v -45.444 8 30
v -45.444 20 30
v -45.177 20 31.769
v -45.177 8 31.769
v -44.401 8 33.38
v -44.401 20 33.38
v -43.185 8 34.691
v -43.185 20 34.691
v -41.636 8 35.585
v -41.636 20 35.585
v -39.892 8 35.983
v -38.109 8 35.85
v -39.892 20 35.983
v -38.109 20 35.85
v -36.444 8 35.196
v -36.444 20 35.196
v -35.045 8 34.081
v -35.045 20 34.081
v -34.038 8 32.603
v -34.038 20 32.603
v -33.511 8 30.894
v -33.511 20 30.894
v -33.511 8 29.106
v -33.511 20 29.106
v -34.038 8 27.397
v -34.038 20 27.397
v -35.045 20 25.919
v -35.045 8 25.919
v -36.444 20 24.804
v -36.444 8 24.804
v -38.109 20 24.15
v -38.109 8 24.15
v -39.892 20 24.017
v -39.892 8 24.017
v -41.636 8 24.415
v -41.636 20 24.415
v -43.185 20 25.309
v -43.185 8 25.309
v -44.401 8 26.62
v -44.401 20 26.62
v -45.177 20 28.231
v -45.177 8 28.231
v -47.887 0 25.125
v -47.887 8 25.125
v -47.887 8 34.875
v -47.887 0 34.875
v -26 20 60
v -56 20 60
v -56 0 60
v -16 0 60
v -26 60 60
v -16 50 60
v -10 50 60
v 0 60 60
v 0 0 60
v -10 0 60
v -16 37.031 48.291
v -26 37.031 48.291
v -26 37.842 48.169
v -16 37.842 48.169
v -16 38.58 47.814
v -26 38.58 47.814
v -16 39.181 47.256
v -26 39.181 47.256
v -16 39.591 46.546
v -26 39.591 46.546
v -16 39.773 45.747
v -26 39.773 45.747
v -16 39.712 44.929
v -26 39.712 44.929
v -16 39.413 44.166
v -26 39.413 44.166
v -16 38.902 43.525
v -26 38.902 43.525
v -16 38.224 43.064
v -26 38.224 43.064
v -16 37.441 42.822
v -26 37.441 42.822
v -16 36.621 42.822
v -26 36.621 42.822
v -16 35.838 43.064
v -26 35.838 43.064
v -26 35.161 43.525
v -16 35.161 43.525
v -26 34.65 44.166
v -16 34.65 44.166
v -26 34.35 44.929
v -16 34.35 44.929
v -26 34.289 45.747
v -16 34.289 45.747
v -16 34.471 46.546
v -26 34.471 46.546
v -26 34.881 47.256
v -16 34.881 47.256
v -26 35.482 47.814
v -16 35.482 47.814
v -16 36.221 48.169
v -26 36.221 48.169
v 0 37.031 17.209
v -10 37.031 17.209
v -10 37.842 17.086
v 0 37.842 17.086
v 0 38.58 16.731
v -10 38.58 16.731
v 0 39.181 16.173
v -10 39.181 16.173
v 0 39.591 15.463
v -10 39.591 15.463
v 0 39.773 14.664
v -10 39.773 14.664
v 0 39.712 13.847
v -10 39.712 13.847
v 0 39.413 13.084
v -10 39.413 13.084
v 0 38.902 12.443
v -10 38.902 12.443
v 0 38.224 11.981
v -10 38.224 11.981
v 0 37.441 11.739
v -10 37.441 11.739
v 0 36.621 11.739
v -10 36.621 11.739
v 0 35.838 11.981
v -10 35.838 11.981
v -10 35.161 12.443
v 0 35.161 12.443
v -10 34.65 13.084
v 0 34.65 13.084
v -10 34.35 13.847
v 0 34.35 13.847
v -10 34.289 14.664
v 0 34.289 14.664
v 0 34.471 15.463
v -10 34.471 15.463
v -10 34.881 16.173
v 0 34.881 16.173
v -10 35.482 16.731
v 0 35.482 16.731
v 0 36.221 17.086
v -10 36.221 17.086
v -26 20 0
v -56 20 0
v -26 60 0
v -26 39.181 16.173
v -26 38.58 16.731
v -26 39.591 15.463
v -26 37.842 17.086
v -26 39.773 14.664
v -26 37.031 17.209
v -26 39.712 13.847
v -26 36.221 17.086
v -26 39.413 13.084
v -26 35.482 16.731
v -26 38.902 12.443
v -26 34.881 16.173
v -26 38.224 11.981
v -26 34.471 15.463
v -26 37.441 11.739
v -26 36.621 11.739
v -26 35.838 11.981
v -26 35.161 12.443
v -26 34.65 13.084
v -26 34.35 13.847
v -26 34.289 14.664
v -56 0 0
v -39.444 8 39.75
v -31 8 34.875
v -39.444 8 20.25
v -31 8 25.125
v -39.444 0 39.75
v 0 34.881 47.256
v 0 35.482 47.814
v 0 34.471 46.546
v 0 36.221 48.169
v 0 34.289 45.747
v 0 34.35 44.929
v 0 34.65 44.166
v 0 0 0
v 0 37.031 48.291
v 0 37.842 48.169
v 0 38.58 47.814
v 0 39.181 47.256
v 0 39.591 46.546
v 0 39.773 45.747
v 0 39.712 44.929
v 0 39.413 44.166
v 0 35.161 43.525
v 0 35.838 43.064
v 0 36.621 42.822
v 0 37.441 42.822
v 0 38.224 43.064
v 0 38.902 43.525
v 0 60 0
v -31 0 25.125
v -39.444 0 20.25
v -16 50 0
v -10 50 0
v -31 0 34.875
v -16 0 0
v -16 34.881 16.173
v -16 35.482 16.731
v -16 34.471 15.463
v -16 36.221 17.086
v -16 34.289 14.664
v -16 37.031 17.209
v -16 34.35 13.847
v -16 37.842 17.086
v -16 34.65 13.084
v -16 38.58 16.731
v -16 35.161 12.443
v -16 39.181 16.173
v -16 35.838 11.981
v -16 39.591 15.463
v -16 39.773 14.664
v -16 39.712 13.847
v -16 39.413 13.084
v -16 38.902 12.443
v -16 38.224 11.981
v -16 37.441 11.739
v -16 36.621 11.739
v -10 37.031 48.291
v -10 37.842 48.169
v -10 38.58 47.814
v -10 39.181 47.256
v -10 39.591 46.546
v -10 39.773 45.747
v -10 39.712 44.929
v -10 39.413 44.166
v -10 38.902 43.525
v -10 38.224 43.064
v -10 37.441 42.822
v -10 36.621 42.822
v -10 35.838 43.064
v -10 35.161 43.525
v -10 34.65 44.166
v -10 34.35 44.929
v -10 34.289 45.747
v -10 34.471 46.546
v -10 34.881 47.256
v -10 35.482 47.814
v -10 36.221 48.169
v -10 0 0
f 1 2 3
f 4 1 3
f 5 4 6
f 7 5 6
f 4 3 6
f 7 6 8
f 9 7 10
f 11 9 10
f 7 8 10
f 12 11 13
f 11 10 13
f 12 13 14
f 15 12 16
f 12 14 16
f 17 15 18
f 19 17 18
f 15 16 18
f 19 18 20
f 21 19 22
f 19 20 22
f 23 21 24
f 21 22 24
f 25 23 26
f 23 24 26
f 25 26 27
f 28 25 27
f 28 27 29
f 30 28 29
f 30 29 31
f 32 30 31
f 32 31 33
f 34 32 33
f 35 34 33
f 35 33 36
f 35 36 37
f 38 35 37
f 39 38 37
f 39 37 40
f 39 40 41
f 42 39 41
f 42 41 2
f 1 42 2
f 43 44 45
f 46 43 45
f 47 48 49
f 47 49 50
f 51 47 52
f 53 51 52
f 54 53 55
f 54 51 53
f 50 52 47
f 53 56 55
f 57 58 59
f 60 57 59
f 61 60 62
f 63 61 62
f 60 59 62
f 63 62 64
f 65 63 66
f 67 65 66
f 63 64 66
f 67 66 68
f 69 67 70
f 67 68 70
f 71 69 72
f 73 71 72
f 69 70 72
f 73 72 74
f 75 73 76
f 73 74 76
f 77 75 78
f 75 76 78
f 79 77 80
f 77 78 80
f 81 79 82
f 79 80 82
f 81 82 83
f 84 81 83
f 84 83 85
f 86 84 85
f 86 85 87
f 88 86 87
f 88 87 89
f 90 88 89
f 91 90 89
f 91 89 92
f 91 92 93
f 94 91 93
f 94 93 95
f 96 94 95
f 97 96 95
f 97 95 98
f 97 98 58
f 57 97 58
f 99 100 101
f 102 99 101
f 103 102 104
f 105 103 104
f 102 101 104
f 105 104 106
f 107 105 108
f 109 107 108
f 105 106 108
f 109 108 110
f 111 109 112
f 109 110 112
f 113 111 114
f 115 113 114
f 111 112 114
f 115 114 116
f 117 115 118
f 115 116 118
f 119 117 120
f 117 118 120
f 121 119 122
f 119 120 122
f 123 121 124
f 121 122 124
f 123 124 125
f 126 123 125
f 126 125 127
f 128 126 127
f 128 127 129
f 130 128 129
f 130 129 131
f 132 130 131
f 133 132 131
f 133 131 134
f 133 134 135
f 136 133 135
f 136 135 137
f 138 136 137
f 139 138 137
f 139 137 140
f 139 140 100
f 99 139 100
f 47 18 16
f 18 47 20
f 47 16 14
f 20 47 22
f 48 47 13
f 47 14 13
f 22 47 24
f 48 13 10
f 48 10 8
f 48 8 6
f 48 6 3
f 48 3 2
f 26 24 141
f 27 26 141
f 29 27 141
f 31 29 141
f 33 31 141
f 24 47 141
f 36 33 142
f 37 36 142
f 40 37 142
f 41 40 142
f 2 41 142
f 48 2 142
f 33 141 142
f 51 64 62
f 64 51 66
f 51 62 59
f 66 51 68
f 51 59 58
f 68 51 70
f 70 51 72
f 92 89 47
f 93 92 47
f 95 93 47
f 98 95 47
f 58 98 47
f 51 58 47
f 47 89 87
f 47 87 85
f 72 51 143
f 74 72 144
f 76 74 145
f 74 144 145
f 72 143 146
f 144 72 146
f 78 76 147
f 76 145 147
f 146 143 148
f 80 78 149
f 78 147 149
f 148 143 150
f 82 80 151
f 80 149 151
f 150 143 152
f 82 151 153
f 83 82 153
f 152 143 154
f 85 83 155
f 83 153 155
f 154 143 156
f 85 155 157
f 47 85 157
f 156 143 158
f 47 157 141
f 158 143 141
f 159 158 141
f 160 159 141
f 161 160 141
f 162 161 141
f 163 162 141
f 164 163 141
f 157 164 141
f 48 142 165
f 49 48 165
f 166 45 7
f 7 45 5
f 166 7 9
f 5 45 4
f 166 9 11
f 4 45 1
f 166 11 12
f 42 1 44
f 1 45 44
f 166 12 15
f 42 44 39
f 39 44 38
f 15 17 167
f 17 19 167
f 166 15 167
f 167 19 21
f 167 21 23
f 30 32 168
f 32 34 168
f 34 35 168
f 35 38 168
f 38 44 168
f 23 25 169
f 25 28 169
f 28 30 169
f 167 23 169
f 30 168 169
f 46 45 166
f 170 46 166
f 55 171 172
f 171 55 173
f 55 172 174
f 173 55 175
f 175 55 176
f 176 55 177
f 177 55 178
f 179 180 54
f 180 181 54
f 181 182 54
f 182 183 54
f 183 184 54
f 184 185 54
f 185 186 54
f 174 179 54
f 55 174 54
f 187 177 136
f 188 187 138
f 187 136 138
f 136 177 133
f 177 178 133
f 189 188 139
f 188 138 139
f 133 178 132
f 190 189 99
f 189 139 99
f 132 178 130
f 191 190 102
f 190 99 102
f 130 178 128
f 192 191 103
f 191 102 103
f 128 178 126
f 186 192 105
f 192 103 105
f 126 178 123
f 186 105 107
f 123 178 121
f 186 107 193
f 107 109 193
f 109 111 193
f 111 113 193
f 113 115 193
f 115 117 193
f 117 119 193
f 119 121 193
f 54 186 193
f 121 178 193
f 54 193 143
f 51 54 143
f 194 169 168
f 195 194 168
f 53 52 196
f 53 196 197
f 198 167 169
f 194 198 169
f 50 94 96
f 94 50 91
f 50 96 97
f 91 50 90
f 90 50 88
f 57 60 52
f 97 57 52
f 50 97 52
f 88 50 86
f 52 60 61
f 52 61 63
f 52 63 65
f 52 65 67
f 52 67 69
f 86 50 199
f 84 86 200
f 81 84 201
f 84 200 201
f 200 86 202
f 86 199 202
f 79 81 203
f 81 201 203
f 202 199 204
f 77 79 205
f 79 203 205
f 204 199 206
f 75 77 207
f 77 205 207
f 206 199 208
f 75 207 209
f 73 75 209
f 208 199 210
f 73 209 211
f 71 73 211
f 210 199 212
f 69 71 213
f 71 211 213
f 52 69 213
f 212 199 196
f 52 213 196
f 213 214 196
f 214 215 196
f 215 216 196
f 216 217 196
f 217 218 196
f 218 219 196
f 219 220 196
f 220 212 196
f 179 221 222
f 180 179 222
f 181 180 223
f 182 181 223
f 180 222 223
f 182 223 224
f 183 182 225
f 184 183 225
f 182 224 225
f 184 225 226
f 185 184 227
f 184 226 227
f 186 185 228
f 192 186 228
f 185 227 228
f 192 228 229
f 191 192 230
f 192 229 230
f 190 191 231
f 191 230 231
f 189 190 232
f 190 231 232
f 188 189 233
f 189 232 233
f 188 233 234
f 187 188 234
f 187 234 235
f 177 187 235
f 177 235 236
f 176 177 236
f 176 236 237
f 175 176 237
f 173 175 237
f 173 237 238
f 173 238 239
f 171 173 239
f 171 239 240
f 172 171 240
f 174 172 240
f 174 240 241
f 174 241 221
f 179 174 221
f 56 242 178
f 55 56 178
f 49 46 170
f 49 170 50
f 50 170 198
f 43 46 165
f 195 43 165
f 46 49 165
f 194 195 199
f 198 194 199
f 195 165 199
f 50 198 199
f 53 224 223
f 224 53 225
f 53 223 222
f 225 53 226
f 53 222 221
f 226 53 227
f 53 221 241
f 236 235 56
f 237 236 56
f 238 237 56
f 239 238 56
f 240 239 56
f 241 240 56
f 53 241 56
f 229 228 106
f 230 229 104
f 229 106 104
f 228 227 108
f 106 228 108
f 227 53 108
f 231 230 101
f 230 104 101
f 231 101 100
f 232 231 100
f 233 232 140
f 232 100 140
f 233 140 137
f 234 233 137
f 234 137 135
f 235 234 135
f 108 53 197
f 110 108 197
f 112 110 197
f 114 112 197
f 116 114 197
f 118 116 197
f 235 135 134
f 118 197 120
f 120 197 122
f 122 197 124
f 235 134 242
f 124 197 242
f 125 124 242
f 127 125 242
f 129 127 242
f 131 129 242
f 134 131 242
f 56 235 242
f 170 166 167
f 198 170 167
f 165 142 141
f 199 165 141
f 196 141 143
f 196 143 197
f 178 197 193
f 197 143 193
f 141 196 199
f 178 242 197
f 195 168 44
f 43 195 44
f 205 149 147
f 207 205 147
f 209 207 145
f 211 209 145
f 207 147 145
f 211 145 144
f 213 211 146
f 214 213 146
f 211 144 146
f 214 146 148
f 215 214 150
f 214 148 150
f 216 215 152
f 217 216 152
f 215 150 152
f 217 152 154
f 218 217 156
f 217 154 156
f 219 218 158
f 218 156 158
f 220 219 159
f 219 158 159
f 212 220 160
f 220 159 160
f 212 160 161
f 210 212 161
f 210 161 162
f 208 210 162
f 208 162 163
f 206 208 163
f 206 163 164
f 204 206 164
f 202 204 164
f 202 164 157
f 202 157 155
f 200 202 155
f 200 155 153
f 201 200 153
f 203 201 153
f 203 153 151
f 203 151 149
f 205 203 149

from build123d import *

# Parameters (mm, degrees)
BOSS_EXTRUDE1_DEPTH = 60
SKETCH3_R           = 6
CUT_EXTRUDE1_DEPTH  = 24
CUT_EXTRUDE2_START  = -12
SKETCH3_3_R         = 6
CUT_EXTRUDE2_DEPTH  = 8
SKETCH4_R           = 2.75
CUT_EXTRUDE3_DEPTH  = 30


with BuildPart() as part:
    # Sketch1 → Boss-Extrude1 (new body)
    with BuildSketch(Plane.XY):
        Polygon((0, 0), (0, 60), (-26, 60), (-26, 20), (-56, 20), (-56, 0), (-16, 0), (-16, 50), (-10, 50), (-10, 0), align=None)
    extrude(amount=BOSS_EXTRUDE1_DEPTH)

    # Sketch3 → Cut-Extrude1 (cut)
    with BuildSketch(Plane(origin=(0, 20, 0), x_dir=(1, 0, 0), z_dir=(0, 1, 0))):
        with Locations(Location((-39.443747687, -30, 0), (0, 0, 180))):
            Circle(SKETCH3_R)
    extrude(amount=-CUT_EXTRUDE1_DEPTH, mode=Mode.SUBTRACT)

    # Sketch3<3> → Cut-Extrude2 (cut)
    with BuildSketch(Plane(origin=(0, 20, 0), x_dir=(1, 0, 0), z_dir=(0, 1, 0)).offset(CUT_EXTRUDE2_START)):
        Polygon((-31, -25.125), (-39.443747687, -20.25), (-47.887495374, -25.125), (-47.887495374, -34.875), (-39.443747687, -39.75), (-31, -34.875), align=None)
        with Locations(Location((-39.443747687, -30, 0), (0, 0, 180))):
            Circle(SKETCH3_3_R, mode=Mode.SUBTRACT)
    extrude(amount=-CUT_EXTRUDE2_DEPTH, mode=Mode.SUBTRACT)

    # Sketch4 → Cut-Extrude3 (cut)
    with BuildSketch(Plane.ZY.offset(26)):
        with Locations((14.458646622, 37.03116756)):
            Circle(SKETCH4_R)
        with Locations((45.541353378, 37.03116756)):
            Circle(SKETCH4_R)
    extrude(amount=-CUT_EXTRUDE3_DEPTH, mode=Mode.SUBTRACT)


solid = part.part
